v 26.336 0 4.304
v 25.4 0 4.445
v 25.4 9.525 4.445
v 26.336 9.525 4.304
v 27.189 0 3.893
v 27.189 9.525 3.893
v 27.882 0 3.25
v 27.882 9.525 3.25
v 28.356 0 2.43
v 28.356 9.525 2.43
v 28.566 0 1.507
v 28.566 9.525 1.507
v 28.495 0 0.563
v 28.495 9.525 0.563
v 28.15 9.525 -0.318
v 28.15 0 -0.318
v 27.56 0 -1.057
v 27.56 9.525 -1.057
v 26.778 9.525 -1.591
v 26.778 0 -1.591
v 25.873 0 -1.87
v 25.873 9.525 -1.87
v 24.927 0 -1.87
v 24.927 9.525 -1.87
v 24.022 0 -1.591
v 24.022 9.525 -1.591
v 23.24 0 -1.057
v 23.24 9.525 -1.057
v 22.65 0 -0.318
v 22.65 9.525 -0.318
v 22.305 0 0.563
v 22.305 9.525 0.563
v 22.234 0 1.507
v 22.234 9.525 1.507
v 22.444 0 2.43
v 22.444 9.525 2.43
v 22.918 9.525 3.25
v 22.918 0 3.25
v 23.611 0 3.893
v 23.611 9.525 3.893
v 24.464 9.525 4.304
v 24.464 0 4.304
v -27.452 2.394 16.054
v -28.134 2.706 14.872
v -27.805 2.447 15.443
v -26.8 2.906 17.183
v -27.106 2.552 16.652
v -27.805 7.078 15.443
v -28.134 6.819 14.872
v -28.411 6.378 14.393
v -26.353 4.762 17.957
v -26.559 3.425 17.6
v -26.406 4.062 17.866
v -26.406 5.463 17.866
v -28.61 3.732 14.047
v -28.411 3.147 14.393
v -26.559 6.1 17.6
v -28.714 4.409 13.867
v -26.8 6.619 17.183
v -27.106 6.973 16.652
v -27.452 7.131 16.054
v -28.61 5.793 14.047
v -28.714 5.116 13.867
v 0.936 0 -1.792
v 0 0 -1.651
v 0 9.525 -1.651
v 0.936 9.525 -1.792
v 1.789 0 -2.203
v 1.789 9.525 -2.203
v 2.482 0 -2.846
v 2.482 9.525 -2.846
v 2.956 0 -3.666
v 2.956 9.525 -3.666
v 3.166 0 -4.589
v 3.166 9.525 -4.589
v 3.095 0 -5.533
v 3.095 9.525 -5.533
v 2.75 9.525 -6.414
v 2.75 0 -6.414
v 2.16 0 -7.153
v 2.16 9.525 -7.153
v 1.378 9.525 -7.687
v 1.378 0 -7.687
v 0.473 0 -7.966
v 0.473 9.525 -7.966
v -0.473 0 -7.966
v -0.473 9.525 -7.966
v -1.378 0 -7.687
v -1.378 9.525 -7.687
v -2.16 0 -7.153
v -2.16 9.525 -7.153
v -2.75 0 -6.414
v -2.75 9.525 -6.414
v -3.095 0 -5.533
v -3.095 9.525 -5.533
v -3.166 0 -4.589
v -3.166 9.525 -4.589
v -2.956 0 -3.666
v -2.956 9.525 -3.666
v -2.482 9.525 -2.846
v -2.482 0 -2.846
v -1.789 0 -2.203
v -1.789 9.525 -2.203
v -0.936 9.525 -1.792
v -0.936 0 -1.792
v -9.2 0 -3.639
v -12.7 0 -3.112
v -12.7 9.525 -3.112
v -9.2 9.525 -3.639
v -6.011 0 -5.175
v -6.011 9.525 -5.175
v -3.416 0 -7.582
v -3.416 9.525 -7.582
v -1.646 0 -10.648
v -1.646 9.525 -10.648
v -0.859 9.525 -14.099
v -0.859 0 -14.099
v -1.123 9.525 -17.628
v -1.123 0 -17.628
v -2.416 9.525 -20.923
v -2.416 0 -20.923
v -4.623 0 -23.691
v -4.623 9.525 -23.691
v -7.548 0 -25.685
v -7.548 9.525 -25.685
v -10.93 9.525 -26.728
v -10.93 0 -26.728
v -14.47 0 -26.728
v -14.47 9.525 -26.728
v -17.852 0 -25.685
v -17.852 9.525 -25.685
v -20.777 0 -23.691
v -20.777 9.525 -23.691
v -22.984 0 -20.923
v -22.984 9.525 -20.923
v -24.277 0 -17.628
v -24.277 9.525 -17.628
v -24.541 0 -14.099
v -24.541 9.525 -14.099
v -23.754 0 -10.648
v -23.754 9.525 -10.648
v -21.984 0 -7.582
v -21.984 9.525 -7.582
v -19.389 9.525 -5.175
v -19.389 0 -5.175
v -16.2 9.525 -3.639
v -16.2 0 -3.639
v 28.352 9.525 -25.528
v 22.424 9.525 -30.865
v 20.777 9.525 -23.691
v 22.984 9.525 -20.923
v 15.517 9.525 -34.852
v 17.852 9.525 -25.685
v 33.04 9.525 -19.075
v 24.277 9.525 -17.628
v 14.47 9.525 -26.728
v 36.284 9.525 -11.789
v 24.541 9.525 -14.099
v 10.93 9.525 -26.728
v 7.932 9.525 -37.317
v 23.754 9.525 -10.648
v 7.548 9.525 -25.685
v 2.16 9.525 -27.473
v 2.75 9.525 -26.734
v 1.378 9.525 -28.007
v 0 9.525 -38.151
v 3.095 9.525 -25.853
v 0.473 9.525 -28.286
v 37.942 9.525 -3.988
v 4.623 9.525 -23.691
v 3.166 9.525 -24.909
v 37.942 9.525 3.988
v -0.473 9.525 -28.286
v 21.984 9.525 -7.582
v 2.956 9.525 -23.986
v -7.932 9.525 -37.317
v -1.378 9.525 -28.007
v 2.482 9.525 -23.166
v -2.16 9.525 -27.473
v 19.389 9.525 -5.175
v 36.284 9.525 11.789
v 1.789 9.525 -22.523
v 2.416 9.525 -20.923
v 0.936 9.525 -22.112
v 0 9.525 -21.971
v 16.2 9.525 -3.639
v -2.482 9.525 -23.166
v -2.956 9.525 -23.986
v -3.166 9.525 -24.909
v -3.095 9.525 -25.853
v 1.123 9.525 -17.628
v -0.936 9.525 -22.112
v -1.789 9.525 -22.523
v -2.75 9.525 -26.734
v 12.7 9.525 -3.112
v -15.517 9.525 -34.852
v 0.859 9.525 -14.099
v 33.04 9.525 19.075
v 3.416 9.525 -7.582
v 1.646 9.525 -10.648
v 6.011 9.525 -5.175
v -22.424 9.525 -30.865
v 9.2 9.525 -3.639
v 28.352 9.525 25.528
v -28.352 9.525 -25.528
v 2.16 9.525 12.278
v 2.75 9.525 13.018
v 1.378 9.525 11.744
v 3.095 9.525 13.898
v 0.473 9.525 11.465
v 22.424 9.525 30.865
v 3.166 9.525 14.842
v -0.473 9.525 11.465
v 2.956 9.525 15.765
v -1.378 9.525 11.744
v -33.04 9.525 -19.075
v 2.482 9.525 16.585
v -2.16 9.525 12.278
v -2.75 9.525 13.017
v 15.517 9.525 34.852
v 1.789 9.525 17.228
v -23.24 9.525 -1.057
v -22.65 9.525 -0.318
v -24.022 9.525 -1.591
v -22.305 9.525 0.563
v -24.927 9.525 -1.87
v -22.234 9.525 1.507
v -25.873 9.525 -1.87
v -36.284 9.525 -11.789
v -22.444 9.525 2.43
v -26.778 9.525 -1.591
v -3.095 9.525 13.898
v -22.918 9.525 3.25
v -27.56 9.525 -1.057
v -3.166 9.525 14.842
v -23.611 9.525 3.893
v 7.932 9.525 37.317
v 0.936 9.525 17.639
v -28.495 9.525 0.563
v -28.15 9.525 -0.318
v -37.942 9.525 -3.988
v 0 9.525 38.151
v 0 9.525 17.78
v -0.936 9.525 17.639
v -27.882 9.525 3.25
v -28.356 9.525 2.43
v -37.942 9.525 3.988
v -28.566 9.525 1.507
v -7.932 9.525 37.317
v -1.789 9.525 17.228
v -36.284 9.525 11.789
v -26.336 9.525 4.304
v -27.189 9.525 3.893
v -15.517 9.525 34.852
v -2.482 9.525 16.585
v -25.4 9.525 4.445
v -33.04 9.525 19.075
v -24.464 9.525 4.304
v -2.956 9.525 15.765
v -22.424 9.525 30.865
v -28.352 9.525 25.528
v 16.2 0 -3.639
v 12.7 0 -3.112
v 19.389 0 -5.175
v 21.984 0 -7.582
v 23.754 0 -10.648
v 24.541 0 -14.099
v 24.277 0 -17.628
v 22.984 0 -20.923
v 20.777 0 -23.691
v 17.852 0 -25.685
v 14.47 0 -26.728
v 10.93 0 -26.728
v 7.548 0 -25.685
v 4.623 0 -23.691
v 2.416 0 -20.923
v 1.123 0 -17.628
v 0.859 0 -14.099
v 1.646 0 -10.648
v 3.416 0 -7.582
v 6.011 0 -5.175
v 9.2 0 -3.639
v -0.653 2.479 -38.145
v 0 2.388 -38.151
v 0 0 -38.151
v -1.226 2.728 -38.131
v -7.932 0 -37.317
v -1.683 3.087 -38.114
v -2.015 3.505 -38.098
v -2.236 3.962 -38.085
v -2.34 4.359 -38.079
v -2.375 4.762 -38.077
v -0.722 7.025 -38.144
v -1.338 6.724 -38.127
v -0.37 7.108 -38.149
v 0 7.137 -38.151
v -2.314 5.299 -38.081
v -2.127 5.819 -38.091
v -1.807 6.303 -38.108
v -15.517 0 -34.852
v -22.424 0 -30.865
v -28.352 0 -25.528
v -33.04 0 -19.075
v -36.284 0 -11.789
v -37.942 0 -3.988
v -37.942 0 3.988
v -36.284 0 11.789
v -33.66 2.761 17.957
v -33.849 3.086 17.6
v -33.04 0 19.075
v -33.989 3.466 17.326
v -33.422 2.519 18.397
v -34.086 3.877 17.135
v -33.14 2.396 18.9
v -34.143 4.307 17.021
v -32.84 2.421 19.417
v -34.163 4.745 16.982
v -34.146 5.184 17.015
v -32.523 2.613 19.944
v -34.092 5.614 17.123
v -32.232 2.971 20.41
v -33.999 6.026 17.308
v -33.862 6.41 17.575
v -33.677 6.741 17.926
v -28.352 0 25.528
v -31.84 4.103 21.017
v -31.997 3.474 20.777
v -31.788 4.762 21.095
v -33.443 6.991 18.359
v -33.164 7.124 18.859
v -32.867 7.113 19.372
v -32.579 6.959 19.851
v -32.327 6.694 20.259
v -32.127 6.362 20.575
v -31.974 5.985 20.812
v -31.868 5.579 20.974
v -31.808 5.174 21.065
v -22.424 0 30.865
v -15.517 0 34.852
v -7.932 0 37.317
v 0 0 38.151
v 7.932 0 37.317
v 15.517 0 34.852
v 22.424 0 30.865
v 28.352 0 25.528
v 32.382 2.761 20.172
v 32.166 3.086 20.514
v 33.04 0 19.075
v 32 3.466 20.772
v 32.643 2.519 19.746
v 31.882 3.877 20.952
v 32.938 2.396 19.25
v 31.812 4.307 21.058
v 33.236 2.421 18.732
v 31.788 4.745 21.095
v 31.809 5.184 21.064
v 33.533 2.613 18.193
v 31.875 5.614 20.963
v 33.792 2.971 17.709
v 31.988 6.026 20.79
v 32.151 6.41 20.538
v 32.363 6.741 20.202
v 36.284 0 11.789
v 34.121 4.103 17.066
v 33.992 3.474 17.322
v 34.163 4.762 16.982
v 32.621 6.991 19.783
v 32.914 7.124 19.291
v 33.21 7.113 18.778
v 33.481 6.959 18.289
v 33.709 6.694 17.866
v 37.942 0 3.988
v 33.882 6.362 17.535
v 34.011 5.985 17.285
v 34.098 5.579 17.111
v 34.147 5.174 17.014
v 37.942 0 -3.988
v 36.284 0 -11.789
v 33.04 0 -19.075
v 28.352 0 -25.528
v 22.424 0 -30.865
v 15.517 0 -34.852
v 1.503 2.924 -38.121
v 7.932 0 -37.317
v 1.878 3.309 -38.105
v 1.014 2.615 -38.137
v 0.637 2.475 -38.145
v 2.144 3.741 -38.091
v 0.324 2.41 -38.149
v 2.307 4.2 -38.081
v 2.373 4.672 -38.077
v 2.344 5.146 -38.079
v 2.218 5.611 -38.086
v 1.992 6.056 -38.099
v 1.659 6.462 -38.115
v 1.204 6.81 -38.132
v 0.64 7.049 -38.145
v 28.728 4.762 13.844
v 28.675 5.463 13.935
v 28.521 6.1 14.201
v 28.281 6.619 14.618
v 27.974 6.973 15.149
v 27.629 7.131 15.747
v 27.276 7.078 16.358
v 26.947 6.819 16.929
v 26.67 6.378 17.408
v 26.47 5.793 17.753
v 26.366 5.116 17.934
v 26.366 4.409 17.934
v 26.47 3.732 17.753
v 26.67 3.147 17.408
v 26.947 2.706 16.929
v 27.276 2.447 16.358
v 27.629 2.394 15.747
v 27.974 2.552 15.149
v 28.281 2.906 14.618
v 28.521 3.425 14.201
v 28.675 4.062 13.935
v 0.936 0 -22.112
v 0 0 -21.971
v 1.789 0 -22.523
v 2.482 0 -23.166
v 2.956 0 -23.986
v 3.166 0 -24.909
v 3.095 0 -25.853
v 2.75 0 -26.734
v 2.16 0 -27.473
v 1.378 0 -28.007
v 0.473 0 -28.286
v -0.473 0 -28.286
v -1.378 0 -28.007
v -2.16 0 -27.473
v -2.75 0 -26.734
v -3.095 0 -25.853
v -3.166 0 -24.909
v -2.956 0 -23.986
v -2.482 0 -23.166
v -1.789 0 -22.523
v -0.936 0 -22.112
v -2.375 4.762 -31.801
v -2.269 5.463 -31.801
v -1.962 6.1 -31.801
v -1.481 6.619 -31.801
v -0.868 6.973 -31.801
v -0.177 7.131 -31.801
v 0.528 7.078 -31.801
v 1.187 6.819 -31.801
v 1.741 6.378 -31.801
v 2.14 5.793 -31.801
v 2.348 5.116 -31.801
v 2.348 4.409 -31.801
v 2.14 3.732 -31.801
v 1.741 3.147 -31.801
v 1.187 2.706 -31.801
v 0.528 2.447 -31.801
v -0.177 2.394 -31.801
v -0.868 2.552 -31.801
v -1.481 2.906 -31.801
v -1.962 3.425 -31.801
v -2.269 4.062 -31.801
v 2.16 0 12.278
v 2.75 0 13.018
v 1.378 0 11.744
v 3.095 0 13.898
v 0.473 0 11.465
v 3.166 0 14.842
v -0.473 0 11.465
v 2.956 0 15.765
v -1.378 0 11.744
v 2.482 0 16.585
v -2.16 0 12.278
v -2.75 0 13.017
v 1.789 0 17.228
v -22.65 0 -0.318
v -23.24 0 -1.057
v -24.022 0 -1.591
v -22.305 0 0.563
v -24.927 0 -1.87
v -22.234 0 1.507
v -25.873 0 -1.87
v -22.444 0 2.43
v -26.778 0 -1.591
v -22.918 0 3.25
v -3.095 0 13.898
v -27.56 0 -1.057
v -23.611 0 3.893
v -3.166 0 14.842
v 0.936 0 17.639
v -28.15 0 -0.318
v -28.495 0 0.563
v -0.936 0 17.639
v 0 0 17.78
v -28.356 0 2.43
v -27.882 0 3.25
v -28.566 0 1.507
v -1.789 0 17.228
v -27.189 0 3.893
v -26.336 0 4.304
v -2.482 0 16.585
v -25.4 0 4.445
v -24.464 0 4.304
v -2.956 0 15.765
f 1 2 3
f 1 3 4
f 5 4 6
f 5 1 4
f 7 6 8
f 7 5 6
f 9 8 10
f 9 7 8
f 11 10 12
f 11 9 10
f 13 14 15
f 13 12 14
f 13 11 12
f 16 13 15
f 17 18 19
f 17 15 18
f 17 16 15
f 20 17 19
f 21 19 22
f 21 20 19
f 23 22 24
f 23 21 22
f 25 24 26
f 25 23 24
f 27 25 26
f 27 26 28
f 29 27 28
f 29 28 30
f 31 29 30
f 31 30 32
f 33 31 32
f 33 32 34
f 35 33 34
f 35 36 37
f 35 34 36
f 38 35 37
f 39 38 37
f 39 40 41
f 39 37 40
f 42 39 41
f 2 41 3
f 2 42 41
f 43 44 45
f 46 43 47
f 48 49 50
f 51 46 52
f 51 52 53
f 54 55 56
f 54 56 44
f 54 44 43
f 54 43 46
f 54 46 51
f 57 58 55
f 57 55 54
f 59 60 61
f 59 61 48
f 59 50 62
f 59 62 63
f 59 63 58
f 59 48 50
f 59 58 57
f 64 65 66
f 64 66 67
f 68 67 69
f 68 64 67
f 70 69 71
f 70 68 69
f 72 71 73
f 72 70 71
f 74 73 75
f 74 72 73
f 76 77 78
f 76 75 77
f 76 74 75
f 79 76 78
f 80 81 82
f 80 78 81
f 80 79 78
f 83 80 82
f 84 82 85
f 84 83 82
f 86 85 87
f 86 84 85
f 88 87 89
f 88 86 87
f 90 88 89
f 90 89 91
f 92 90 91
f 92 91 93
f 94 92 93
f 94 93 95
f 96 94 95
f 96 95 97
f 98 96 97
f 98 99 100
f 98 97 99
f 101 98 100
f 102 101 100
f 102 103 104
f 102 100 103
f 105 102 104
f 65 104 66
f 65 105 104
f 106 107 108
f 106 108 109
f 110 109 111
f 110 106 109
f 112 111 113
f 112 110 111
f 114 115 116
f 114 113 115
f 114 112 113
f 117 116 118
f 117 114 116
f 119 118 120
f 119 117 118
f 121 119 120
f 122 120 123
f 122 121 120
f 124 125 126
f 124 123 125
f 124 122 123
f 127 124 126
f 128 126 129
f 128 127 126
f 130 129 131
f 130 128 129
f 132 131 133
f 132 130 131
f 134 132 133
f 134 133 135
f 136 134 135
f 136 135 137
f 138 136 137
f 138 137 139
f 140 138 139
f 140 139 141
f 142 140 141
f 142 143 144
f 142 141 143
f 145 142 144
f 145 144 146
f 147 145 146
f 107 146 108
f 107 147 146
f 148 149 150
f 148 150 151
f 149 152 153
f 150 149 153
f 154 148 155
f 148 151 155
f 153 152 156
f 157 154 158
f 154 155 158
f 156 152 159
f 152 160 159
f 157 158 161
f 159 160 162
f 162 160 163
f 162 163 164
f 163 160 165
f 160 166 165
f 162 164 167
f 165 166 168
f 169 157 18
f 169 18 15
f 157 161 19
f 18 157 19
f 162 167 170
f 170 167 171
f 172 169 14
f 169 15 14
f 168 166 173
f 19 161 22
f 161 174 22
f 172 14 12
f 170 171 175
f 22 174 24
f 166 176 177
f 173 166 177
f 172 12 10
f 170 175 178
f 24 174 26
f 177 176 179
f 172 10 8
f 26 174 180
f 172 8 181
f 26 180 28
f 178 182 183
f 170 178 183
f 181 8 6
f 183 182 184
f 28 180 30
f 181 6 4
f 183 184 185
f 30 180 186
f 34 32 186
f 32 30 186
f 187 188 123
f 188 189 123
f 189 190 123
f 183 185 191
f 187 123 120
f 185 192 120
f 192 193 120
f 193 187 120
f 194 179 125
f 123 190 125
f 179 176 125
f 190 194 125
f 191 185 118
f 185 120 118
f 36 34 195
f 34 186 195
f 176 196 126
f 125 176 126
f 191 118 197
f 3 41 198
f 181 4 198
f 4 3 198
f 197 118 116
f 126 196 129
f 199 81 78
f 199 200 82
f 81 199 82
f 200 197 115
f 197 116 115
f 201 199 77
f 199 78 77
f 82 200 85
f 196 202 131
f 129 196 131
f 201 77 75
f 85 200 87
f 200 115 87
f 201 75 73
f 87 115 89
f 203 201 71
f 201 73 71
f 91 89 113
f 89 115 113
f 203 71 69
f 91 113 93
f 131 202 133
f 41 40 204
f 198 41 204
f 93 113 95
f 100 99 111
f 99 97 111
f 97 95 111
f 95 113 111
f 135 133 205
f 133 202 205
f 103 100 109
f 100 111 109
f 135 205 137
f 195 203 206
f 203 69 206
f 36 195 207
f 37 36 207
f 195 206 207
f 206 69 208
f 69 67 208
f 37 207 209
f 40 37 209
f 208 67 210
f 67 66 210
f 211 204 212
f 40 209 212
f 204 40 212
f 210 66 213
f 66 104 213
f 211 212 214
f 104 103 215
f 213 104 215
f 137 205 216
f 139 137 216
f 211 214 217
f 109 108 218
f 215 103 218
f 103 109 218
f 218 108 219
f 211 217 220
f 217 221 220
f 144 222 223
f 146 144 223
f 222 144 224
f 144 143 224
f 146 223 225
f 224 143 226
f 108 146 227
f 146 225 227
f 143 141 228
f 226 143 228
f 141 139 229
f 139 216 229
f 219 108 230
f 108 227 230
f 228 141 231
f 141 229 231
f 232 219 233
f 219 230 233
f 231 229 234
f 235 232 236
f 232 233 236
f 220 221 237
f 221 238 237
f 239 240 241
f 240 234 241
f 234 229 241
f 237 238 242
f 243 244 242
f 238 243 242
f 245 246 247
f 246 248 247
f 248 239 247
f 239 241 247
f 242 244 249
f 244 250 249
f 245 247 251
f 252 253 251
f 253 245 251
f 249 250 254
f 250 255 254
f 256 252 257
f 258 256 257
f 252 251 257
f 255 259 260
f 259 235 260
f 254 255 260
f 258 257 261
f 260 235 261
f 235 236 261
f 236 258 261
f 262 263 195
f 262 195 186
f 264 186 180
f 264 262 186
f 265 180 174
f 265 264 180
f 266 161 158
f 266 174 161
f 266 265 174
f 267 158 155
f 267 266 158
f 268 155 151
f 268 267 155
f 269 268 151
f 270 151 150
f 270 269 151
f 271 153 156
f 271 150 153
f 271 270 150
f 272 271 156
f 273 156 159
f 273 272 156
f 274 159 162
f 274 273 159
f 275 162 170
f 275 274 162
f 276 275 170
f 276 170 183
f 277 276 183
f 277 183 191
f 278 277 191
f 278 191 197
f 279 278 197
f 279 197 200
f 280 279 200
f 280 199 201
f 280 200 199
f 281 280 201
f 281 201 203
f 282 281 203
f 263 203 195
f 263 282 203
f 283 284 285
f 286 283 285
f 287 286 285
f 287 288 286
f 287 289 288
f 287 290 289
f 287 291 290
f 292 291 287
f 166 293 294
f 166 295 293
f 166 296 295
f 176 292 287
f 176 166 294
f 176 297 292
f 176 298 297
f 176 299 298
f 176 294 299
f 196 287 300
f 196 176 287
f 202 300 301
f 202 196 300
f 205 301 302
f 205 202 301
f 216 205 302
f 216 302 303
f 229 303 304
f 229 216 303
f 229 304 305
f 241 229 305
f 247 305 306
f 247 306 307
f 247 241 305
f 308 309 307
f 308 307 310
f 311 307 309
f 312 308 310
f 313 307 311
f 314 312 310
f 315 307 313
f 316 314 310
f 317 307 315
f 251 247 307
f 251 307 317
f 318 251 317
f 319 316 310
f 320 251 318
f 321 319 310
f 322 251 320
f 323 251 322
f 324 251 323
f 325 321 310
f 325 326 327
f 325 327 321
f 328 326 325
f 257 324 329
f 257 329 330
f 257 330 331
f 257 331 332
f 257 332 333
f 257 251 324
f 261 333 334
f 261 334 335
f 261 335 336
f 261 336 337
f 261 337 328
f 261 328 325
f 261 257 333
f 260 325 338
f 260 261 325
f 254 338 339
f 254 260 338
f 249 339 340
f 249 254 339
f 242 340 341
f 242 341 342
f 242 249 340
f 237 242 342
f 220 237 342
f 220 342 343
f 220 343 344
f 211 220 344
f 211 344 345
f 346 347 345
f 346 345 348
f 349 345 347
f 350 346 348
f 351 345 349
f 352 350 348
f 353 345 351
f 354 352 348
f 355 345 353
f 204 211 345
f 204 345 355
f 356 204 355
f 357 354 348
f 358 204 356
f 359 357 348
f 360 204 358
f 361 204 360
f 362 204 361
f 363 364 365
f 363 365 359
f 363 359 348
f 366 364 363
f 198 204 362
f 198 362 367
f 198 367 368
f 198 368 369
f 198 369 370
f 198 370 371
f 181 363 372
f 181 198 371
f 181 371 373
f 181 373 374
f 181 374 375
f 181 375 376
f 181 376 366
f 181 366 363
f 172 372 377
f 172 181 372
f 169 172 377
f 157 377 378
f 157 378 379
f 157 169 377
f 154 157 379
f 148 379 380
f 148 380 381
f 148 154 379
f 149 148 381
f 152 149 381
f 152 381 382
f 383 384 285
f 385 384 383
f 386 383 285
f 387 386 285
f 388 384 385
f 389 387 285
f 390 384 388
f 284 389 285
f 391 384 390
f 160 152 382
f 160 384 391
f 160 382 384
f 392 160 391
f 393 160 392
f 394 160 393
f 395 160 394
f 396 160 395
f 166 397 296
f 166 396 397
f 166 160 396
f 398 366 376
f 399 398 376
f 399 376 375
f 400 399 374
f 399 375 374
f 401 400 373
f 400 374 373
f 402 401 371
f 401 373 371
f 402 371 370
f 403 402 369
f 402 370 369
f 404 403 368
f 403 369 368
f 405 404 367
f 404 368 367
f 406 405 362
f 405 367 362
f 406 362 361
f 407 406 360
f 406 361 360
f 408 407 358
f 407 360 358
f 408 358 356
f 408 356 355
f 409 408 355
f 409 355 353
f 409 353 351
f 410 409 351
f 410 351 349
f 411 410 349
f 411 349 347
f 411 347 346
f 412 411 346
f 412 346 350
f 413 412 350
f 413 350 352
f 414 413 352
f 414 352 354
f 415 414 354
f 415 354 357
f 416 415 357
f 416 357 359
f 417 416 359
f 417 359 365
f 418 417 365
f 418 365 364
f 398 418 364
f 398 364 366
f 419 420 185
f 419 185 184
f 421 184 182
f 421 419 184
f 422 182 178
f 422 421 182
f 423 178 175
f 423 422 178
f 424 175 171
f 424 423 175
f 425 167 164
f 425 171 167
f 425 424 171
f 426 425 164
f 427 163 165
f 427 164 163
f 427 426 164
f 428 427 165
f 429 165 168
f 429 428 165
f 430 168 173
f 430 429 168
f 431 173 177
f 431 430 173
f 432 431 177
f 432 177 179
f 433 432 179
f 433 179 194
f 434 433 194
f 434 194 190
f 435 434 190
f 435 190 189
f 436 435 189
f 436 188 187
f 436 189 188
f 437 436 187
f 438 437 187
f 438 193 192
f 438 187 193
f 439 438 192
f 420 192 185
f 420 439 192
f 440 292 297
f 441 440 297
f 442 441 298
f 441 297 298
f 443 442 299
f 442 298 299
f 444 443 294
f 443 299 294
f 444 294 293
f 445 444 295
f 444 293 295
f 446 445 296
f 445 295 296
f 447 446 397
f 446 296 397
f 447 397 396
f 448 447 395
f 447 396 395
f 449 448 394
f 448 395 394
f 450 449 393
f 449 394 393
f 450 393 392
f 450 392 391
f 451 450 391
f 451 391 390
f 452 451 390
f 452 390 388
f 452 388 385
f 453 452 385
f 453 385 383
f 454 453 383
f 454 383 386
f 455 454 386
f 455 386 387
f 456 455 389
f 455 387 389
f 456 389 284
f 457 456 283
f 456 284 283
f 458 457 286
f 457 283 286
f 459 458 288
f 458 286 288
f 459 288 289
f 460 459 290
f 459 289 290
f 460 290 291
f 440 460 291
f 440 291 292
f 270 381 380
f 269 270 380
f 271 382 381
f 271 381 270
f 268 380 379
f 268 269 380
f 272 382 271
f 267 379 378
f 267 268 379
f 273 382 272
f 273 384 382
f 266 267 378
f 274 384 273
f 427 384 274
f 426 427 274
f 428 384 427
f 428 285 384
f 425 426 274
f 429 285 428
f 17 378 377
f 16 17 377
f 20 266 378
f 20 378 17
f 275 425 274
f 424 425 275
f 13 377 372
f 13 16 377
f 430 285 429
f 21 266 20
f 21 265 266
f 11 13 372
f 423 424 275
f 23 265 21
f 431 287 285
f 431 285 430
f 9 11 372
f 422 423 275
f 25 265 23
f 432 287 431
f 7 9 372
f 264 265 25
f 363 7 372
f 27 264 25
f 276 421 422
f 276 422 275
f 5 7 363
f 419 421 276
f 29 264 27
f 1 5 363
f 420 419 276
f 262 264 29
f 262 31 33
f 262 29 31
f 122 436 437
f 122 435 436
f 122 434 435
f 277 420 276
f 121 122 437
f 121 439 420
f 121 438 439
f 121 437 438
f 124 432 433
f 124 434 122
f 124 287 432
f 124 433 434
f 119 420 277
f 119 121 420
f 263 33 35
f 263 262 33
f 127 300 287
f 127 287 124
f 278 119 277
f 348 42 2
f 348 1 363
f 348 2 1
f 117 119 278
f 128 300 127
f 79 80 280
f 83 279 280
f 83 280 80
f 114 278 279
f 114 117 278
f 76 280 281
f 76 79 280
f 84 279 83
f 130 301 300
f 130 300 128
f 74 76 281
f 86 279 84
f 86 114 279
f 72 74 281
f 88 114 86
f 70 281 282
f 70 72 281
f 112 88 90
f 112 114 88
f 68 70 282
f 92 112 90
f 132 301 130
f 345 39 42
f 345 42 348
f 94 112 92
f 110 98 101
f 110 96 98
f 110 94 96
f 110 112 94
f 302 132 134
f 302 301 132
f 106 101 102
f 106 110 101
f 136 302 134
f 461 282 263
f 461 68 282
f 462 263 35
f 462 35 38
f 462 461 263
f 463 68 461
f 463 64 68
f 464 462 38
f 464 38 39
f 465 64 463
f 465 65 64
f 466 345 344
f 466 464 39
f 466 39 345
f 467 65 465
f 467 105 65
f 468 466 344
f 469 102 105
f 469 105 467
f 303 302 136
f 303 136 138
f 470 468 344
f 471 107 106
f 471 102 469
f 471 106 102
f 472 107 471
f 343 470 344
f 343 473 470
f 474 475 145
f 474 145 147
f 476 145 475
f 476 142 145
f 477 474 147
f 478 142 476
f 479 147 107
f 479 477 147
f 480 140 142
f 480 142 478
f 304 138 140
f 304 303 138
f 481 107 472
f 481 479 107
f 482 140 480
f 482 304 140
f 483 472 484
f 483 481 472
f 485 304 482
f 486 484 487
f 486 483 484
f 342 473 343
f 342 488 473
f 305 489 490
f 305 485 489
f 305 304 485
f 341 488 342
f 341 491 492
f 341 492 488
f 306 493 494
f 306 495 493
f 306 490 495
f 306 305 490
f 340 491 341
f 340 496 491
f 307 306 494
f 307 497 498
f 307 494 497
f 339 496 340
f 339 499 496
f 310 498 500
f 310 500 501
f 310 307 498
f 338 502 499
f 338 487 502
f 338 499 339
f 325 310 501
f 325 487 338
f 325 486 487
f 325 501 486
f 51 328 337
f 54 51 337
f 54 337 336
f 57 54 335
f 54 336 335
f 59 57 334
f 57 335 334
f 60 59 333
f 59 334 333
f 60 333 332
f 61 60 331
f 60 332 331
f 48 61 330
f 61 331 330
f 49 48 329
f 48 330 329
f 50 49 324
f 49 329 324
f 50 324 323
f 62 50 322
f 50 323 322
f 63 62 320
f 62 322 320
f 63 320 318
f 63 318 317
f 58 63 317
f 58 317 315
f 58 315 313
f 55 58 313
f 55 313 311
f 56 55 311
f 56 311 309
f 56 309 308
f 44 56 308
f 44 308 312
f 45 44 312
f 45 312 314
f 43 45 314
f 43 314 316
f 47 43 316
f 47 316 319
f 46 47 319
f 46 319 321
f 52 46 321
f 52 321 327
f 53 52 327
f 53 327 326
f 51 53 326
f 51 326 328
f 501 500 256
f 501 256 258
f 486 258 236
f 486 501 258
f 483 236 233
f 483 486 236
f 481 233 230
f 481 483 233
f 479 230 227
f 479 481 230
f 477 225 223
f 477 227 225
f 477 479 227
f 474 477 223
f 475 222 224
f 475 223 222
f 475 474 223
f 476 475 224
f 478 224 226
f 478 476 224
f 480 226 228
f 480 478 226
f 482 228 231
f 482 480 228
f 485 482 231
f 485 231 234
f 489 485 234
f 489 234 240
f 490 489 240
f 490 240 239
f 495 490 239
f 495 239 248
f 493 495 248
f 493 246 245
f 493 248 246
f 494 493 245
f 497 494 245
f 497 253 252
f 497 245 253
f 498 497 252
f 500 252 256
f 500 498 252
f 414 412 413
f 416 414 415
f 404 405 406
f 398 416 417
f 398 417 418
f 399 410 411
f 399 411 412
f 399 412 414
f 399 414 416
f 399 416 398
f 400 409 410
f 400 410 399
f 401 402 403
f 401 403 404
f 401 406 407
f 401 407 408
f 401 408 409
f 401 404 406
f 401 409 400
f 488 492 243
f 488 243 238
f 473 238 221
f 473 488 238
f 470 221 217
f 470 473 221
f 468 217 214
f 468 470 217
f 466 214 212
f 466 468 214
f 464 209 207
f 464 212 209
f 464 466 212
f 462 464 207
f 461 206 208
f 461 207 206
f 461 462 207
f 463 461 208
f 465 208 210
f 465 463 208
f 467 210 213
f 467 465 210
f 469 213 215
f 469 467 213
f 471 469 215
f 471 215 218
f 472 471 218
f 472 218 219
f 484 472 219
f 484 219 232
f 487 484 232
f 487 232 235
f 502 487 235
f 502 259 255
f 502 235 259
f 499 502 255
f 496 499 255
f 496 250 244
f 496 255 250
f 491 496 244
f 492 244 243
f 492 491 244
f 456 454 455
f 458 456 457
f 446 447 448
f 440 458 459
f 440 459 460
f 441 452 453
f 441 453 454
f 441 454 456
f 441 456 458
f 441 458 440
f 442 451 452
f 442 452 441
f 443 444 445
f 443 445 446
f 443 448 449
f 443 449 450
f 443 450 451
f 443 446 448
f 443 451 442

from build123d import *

# Parameters (mm, degrees)
SKETCH1_W               = 38.1508
SKETCH1_H               = 9.525
CUT_EXTRUDE1_DEPTH      = 55.787705795
CUT_EXTRUDE1_DEPTH_BACK = 55.787705795
SKETCH2_R               = 11.8745
SKETCH2_R_2             = 3.175
CUT_EXTRUDE2_DEPTH      = 55.787705795
CUT_EXTRUDE2_DEPTH_BACK = 55.787705795
SKETCH3_R               = 3.175
SKETCH4_R               = 2.3749
CUT_EXTRUDE3_DEPTH      = 6.35
CIRPATTERN1_COUNT       = 3


with BuildPart() as part:
    # Sketch1 → Revolve1 (revolve)
    with BuildSketch(Plane.XY):
        with Locations((19.0754, 4.7625)):
            Rectangle(SKETCH1_W, SKETCH1_H)
    revolve(axis=Axis((0, 0, 0), (0, 1, 0)))

    # Sketch2 → Cut-Extrude1 (cut, two sides: drawn at the far end of the back side and taken through both)
    with BuildSketch(Plane(origin=(0, 9.525, 0), x_dir=(1, 0, 0), z_dir=(0, 1, 0)).offset(-CUT_EXTRUDE1_DEPTH_BACK)):
        with Locations((-12.7, 14.986)):
            Circle(SKETCH2_R)
        with Locations((12.7, 14.986)):
            Circle(SKETCH2_R)
        with Locations((0, 25.146)):
            Circle(SKETCH2_R_2)
        with Locations((0, 4.826)):
            Circle(SKETCH2_R_2)
        with Locations((0, -14.605)):
            Circle(SKETCH2_R_2)
    extrude(amount=CUT_EXTRUDE1_DEPTH + CUT_EXTRUDE1_DEPTH_BACK, mode=Mode.SUBTRACT)

    # Sketch3 → Cut-Extrude2 (cut, two sides: drawn at the far end of the back side and taken through both)
    with BuildSketch(Plane(origin=(0, 9.525, 0), x_dir=(1, 0, 0), z_dir=(0, 1, 0)).offset(-CUT_EXTRUDE2_DEPTH_BACK)):
        with Locations((-25.4, -1.27)):
            Circle(SKETCH3_R)
        with Locations((25.4, -1.27)):
            Circle(SKETCH3_R)
    extrude(amount=CUT_EXTRUDE2_DEPTH + CUT_EXTRUDE2_DEPTH_BACK, mode=Mode.SUBTRACT)

    # Sketch4 → Cut-Extrude3 (cut)
    with BuildSketch(Plane(origin=(33.039561975, 0, 19.0754), x_dir=(0, -1, 0), z_dir=(0.866025403784438, 0, 0.500000000000001))):
        with Locations((-4.7625, 0)):
            Circle(SKETCH4_R)
    cut_extrude3 = extrude(amount=-CUT_EXTRUDE3_DEPTH, mode=Mode.SUBTRACT)

    # CirPattern1: Cut-Extrude3 ×3 about axis
    cirpattern1_axis = Axis((0, 55, 0), (0, -1, 0))
    for i in range(1, CIRPATTERN1_COUNT):
        add(cut_extrude3.rotate(cirpattern1_axis, i * 360 / CIRPATTERN1_COUNT), mode=Mode.SUBTRACT)


solid = part.part
